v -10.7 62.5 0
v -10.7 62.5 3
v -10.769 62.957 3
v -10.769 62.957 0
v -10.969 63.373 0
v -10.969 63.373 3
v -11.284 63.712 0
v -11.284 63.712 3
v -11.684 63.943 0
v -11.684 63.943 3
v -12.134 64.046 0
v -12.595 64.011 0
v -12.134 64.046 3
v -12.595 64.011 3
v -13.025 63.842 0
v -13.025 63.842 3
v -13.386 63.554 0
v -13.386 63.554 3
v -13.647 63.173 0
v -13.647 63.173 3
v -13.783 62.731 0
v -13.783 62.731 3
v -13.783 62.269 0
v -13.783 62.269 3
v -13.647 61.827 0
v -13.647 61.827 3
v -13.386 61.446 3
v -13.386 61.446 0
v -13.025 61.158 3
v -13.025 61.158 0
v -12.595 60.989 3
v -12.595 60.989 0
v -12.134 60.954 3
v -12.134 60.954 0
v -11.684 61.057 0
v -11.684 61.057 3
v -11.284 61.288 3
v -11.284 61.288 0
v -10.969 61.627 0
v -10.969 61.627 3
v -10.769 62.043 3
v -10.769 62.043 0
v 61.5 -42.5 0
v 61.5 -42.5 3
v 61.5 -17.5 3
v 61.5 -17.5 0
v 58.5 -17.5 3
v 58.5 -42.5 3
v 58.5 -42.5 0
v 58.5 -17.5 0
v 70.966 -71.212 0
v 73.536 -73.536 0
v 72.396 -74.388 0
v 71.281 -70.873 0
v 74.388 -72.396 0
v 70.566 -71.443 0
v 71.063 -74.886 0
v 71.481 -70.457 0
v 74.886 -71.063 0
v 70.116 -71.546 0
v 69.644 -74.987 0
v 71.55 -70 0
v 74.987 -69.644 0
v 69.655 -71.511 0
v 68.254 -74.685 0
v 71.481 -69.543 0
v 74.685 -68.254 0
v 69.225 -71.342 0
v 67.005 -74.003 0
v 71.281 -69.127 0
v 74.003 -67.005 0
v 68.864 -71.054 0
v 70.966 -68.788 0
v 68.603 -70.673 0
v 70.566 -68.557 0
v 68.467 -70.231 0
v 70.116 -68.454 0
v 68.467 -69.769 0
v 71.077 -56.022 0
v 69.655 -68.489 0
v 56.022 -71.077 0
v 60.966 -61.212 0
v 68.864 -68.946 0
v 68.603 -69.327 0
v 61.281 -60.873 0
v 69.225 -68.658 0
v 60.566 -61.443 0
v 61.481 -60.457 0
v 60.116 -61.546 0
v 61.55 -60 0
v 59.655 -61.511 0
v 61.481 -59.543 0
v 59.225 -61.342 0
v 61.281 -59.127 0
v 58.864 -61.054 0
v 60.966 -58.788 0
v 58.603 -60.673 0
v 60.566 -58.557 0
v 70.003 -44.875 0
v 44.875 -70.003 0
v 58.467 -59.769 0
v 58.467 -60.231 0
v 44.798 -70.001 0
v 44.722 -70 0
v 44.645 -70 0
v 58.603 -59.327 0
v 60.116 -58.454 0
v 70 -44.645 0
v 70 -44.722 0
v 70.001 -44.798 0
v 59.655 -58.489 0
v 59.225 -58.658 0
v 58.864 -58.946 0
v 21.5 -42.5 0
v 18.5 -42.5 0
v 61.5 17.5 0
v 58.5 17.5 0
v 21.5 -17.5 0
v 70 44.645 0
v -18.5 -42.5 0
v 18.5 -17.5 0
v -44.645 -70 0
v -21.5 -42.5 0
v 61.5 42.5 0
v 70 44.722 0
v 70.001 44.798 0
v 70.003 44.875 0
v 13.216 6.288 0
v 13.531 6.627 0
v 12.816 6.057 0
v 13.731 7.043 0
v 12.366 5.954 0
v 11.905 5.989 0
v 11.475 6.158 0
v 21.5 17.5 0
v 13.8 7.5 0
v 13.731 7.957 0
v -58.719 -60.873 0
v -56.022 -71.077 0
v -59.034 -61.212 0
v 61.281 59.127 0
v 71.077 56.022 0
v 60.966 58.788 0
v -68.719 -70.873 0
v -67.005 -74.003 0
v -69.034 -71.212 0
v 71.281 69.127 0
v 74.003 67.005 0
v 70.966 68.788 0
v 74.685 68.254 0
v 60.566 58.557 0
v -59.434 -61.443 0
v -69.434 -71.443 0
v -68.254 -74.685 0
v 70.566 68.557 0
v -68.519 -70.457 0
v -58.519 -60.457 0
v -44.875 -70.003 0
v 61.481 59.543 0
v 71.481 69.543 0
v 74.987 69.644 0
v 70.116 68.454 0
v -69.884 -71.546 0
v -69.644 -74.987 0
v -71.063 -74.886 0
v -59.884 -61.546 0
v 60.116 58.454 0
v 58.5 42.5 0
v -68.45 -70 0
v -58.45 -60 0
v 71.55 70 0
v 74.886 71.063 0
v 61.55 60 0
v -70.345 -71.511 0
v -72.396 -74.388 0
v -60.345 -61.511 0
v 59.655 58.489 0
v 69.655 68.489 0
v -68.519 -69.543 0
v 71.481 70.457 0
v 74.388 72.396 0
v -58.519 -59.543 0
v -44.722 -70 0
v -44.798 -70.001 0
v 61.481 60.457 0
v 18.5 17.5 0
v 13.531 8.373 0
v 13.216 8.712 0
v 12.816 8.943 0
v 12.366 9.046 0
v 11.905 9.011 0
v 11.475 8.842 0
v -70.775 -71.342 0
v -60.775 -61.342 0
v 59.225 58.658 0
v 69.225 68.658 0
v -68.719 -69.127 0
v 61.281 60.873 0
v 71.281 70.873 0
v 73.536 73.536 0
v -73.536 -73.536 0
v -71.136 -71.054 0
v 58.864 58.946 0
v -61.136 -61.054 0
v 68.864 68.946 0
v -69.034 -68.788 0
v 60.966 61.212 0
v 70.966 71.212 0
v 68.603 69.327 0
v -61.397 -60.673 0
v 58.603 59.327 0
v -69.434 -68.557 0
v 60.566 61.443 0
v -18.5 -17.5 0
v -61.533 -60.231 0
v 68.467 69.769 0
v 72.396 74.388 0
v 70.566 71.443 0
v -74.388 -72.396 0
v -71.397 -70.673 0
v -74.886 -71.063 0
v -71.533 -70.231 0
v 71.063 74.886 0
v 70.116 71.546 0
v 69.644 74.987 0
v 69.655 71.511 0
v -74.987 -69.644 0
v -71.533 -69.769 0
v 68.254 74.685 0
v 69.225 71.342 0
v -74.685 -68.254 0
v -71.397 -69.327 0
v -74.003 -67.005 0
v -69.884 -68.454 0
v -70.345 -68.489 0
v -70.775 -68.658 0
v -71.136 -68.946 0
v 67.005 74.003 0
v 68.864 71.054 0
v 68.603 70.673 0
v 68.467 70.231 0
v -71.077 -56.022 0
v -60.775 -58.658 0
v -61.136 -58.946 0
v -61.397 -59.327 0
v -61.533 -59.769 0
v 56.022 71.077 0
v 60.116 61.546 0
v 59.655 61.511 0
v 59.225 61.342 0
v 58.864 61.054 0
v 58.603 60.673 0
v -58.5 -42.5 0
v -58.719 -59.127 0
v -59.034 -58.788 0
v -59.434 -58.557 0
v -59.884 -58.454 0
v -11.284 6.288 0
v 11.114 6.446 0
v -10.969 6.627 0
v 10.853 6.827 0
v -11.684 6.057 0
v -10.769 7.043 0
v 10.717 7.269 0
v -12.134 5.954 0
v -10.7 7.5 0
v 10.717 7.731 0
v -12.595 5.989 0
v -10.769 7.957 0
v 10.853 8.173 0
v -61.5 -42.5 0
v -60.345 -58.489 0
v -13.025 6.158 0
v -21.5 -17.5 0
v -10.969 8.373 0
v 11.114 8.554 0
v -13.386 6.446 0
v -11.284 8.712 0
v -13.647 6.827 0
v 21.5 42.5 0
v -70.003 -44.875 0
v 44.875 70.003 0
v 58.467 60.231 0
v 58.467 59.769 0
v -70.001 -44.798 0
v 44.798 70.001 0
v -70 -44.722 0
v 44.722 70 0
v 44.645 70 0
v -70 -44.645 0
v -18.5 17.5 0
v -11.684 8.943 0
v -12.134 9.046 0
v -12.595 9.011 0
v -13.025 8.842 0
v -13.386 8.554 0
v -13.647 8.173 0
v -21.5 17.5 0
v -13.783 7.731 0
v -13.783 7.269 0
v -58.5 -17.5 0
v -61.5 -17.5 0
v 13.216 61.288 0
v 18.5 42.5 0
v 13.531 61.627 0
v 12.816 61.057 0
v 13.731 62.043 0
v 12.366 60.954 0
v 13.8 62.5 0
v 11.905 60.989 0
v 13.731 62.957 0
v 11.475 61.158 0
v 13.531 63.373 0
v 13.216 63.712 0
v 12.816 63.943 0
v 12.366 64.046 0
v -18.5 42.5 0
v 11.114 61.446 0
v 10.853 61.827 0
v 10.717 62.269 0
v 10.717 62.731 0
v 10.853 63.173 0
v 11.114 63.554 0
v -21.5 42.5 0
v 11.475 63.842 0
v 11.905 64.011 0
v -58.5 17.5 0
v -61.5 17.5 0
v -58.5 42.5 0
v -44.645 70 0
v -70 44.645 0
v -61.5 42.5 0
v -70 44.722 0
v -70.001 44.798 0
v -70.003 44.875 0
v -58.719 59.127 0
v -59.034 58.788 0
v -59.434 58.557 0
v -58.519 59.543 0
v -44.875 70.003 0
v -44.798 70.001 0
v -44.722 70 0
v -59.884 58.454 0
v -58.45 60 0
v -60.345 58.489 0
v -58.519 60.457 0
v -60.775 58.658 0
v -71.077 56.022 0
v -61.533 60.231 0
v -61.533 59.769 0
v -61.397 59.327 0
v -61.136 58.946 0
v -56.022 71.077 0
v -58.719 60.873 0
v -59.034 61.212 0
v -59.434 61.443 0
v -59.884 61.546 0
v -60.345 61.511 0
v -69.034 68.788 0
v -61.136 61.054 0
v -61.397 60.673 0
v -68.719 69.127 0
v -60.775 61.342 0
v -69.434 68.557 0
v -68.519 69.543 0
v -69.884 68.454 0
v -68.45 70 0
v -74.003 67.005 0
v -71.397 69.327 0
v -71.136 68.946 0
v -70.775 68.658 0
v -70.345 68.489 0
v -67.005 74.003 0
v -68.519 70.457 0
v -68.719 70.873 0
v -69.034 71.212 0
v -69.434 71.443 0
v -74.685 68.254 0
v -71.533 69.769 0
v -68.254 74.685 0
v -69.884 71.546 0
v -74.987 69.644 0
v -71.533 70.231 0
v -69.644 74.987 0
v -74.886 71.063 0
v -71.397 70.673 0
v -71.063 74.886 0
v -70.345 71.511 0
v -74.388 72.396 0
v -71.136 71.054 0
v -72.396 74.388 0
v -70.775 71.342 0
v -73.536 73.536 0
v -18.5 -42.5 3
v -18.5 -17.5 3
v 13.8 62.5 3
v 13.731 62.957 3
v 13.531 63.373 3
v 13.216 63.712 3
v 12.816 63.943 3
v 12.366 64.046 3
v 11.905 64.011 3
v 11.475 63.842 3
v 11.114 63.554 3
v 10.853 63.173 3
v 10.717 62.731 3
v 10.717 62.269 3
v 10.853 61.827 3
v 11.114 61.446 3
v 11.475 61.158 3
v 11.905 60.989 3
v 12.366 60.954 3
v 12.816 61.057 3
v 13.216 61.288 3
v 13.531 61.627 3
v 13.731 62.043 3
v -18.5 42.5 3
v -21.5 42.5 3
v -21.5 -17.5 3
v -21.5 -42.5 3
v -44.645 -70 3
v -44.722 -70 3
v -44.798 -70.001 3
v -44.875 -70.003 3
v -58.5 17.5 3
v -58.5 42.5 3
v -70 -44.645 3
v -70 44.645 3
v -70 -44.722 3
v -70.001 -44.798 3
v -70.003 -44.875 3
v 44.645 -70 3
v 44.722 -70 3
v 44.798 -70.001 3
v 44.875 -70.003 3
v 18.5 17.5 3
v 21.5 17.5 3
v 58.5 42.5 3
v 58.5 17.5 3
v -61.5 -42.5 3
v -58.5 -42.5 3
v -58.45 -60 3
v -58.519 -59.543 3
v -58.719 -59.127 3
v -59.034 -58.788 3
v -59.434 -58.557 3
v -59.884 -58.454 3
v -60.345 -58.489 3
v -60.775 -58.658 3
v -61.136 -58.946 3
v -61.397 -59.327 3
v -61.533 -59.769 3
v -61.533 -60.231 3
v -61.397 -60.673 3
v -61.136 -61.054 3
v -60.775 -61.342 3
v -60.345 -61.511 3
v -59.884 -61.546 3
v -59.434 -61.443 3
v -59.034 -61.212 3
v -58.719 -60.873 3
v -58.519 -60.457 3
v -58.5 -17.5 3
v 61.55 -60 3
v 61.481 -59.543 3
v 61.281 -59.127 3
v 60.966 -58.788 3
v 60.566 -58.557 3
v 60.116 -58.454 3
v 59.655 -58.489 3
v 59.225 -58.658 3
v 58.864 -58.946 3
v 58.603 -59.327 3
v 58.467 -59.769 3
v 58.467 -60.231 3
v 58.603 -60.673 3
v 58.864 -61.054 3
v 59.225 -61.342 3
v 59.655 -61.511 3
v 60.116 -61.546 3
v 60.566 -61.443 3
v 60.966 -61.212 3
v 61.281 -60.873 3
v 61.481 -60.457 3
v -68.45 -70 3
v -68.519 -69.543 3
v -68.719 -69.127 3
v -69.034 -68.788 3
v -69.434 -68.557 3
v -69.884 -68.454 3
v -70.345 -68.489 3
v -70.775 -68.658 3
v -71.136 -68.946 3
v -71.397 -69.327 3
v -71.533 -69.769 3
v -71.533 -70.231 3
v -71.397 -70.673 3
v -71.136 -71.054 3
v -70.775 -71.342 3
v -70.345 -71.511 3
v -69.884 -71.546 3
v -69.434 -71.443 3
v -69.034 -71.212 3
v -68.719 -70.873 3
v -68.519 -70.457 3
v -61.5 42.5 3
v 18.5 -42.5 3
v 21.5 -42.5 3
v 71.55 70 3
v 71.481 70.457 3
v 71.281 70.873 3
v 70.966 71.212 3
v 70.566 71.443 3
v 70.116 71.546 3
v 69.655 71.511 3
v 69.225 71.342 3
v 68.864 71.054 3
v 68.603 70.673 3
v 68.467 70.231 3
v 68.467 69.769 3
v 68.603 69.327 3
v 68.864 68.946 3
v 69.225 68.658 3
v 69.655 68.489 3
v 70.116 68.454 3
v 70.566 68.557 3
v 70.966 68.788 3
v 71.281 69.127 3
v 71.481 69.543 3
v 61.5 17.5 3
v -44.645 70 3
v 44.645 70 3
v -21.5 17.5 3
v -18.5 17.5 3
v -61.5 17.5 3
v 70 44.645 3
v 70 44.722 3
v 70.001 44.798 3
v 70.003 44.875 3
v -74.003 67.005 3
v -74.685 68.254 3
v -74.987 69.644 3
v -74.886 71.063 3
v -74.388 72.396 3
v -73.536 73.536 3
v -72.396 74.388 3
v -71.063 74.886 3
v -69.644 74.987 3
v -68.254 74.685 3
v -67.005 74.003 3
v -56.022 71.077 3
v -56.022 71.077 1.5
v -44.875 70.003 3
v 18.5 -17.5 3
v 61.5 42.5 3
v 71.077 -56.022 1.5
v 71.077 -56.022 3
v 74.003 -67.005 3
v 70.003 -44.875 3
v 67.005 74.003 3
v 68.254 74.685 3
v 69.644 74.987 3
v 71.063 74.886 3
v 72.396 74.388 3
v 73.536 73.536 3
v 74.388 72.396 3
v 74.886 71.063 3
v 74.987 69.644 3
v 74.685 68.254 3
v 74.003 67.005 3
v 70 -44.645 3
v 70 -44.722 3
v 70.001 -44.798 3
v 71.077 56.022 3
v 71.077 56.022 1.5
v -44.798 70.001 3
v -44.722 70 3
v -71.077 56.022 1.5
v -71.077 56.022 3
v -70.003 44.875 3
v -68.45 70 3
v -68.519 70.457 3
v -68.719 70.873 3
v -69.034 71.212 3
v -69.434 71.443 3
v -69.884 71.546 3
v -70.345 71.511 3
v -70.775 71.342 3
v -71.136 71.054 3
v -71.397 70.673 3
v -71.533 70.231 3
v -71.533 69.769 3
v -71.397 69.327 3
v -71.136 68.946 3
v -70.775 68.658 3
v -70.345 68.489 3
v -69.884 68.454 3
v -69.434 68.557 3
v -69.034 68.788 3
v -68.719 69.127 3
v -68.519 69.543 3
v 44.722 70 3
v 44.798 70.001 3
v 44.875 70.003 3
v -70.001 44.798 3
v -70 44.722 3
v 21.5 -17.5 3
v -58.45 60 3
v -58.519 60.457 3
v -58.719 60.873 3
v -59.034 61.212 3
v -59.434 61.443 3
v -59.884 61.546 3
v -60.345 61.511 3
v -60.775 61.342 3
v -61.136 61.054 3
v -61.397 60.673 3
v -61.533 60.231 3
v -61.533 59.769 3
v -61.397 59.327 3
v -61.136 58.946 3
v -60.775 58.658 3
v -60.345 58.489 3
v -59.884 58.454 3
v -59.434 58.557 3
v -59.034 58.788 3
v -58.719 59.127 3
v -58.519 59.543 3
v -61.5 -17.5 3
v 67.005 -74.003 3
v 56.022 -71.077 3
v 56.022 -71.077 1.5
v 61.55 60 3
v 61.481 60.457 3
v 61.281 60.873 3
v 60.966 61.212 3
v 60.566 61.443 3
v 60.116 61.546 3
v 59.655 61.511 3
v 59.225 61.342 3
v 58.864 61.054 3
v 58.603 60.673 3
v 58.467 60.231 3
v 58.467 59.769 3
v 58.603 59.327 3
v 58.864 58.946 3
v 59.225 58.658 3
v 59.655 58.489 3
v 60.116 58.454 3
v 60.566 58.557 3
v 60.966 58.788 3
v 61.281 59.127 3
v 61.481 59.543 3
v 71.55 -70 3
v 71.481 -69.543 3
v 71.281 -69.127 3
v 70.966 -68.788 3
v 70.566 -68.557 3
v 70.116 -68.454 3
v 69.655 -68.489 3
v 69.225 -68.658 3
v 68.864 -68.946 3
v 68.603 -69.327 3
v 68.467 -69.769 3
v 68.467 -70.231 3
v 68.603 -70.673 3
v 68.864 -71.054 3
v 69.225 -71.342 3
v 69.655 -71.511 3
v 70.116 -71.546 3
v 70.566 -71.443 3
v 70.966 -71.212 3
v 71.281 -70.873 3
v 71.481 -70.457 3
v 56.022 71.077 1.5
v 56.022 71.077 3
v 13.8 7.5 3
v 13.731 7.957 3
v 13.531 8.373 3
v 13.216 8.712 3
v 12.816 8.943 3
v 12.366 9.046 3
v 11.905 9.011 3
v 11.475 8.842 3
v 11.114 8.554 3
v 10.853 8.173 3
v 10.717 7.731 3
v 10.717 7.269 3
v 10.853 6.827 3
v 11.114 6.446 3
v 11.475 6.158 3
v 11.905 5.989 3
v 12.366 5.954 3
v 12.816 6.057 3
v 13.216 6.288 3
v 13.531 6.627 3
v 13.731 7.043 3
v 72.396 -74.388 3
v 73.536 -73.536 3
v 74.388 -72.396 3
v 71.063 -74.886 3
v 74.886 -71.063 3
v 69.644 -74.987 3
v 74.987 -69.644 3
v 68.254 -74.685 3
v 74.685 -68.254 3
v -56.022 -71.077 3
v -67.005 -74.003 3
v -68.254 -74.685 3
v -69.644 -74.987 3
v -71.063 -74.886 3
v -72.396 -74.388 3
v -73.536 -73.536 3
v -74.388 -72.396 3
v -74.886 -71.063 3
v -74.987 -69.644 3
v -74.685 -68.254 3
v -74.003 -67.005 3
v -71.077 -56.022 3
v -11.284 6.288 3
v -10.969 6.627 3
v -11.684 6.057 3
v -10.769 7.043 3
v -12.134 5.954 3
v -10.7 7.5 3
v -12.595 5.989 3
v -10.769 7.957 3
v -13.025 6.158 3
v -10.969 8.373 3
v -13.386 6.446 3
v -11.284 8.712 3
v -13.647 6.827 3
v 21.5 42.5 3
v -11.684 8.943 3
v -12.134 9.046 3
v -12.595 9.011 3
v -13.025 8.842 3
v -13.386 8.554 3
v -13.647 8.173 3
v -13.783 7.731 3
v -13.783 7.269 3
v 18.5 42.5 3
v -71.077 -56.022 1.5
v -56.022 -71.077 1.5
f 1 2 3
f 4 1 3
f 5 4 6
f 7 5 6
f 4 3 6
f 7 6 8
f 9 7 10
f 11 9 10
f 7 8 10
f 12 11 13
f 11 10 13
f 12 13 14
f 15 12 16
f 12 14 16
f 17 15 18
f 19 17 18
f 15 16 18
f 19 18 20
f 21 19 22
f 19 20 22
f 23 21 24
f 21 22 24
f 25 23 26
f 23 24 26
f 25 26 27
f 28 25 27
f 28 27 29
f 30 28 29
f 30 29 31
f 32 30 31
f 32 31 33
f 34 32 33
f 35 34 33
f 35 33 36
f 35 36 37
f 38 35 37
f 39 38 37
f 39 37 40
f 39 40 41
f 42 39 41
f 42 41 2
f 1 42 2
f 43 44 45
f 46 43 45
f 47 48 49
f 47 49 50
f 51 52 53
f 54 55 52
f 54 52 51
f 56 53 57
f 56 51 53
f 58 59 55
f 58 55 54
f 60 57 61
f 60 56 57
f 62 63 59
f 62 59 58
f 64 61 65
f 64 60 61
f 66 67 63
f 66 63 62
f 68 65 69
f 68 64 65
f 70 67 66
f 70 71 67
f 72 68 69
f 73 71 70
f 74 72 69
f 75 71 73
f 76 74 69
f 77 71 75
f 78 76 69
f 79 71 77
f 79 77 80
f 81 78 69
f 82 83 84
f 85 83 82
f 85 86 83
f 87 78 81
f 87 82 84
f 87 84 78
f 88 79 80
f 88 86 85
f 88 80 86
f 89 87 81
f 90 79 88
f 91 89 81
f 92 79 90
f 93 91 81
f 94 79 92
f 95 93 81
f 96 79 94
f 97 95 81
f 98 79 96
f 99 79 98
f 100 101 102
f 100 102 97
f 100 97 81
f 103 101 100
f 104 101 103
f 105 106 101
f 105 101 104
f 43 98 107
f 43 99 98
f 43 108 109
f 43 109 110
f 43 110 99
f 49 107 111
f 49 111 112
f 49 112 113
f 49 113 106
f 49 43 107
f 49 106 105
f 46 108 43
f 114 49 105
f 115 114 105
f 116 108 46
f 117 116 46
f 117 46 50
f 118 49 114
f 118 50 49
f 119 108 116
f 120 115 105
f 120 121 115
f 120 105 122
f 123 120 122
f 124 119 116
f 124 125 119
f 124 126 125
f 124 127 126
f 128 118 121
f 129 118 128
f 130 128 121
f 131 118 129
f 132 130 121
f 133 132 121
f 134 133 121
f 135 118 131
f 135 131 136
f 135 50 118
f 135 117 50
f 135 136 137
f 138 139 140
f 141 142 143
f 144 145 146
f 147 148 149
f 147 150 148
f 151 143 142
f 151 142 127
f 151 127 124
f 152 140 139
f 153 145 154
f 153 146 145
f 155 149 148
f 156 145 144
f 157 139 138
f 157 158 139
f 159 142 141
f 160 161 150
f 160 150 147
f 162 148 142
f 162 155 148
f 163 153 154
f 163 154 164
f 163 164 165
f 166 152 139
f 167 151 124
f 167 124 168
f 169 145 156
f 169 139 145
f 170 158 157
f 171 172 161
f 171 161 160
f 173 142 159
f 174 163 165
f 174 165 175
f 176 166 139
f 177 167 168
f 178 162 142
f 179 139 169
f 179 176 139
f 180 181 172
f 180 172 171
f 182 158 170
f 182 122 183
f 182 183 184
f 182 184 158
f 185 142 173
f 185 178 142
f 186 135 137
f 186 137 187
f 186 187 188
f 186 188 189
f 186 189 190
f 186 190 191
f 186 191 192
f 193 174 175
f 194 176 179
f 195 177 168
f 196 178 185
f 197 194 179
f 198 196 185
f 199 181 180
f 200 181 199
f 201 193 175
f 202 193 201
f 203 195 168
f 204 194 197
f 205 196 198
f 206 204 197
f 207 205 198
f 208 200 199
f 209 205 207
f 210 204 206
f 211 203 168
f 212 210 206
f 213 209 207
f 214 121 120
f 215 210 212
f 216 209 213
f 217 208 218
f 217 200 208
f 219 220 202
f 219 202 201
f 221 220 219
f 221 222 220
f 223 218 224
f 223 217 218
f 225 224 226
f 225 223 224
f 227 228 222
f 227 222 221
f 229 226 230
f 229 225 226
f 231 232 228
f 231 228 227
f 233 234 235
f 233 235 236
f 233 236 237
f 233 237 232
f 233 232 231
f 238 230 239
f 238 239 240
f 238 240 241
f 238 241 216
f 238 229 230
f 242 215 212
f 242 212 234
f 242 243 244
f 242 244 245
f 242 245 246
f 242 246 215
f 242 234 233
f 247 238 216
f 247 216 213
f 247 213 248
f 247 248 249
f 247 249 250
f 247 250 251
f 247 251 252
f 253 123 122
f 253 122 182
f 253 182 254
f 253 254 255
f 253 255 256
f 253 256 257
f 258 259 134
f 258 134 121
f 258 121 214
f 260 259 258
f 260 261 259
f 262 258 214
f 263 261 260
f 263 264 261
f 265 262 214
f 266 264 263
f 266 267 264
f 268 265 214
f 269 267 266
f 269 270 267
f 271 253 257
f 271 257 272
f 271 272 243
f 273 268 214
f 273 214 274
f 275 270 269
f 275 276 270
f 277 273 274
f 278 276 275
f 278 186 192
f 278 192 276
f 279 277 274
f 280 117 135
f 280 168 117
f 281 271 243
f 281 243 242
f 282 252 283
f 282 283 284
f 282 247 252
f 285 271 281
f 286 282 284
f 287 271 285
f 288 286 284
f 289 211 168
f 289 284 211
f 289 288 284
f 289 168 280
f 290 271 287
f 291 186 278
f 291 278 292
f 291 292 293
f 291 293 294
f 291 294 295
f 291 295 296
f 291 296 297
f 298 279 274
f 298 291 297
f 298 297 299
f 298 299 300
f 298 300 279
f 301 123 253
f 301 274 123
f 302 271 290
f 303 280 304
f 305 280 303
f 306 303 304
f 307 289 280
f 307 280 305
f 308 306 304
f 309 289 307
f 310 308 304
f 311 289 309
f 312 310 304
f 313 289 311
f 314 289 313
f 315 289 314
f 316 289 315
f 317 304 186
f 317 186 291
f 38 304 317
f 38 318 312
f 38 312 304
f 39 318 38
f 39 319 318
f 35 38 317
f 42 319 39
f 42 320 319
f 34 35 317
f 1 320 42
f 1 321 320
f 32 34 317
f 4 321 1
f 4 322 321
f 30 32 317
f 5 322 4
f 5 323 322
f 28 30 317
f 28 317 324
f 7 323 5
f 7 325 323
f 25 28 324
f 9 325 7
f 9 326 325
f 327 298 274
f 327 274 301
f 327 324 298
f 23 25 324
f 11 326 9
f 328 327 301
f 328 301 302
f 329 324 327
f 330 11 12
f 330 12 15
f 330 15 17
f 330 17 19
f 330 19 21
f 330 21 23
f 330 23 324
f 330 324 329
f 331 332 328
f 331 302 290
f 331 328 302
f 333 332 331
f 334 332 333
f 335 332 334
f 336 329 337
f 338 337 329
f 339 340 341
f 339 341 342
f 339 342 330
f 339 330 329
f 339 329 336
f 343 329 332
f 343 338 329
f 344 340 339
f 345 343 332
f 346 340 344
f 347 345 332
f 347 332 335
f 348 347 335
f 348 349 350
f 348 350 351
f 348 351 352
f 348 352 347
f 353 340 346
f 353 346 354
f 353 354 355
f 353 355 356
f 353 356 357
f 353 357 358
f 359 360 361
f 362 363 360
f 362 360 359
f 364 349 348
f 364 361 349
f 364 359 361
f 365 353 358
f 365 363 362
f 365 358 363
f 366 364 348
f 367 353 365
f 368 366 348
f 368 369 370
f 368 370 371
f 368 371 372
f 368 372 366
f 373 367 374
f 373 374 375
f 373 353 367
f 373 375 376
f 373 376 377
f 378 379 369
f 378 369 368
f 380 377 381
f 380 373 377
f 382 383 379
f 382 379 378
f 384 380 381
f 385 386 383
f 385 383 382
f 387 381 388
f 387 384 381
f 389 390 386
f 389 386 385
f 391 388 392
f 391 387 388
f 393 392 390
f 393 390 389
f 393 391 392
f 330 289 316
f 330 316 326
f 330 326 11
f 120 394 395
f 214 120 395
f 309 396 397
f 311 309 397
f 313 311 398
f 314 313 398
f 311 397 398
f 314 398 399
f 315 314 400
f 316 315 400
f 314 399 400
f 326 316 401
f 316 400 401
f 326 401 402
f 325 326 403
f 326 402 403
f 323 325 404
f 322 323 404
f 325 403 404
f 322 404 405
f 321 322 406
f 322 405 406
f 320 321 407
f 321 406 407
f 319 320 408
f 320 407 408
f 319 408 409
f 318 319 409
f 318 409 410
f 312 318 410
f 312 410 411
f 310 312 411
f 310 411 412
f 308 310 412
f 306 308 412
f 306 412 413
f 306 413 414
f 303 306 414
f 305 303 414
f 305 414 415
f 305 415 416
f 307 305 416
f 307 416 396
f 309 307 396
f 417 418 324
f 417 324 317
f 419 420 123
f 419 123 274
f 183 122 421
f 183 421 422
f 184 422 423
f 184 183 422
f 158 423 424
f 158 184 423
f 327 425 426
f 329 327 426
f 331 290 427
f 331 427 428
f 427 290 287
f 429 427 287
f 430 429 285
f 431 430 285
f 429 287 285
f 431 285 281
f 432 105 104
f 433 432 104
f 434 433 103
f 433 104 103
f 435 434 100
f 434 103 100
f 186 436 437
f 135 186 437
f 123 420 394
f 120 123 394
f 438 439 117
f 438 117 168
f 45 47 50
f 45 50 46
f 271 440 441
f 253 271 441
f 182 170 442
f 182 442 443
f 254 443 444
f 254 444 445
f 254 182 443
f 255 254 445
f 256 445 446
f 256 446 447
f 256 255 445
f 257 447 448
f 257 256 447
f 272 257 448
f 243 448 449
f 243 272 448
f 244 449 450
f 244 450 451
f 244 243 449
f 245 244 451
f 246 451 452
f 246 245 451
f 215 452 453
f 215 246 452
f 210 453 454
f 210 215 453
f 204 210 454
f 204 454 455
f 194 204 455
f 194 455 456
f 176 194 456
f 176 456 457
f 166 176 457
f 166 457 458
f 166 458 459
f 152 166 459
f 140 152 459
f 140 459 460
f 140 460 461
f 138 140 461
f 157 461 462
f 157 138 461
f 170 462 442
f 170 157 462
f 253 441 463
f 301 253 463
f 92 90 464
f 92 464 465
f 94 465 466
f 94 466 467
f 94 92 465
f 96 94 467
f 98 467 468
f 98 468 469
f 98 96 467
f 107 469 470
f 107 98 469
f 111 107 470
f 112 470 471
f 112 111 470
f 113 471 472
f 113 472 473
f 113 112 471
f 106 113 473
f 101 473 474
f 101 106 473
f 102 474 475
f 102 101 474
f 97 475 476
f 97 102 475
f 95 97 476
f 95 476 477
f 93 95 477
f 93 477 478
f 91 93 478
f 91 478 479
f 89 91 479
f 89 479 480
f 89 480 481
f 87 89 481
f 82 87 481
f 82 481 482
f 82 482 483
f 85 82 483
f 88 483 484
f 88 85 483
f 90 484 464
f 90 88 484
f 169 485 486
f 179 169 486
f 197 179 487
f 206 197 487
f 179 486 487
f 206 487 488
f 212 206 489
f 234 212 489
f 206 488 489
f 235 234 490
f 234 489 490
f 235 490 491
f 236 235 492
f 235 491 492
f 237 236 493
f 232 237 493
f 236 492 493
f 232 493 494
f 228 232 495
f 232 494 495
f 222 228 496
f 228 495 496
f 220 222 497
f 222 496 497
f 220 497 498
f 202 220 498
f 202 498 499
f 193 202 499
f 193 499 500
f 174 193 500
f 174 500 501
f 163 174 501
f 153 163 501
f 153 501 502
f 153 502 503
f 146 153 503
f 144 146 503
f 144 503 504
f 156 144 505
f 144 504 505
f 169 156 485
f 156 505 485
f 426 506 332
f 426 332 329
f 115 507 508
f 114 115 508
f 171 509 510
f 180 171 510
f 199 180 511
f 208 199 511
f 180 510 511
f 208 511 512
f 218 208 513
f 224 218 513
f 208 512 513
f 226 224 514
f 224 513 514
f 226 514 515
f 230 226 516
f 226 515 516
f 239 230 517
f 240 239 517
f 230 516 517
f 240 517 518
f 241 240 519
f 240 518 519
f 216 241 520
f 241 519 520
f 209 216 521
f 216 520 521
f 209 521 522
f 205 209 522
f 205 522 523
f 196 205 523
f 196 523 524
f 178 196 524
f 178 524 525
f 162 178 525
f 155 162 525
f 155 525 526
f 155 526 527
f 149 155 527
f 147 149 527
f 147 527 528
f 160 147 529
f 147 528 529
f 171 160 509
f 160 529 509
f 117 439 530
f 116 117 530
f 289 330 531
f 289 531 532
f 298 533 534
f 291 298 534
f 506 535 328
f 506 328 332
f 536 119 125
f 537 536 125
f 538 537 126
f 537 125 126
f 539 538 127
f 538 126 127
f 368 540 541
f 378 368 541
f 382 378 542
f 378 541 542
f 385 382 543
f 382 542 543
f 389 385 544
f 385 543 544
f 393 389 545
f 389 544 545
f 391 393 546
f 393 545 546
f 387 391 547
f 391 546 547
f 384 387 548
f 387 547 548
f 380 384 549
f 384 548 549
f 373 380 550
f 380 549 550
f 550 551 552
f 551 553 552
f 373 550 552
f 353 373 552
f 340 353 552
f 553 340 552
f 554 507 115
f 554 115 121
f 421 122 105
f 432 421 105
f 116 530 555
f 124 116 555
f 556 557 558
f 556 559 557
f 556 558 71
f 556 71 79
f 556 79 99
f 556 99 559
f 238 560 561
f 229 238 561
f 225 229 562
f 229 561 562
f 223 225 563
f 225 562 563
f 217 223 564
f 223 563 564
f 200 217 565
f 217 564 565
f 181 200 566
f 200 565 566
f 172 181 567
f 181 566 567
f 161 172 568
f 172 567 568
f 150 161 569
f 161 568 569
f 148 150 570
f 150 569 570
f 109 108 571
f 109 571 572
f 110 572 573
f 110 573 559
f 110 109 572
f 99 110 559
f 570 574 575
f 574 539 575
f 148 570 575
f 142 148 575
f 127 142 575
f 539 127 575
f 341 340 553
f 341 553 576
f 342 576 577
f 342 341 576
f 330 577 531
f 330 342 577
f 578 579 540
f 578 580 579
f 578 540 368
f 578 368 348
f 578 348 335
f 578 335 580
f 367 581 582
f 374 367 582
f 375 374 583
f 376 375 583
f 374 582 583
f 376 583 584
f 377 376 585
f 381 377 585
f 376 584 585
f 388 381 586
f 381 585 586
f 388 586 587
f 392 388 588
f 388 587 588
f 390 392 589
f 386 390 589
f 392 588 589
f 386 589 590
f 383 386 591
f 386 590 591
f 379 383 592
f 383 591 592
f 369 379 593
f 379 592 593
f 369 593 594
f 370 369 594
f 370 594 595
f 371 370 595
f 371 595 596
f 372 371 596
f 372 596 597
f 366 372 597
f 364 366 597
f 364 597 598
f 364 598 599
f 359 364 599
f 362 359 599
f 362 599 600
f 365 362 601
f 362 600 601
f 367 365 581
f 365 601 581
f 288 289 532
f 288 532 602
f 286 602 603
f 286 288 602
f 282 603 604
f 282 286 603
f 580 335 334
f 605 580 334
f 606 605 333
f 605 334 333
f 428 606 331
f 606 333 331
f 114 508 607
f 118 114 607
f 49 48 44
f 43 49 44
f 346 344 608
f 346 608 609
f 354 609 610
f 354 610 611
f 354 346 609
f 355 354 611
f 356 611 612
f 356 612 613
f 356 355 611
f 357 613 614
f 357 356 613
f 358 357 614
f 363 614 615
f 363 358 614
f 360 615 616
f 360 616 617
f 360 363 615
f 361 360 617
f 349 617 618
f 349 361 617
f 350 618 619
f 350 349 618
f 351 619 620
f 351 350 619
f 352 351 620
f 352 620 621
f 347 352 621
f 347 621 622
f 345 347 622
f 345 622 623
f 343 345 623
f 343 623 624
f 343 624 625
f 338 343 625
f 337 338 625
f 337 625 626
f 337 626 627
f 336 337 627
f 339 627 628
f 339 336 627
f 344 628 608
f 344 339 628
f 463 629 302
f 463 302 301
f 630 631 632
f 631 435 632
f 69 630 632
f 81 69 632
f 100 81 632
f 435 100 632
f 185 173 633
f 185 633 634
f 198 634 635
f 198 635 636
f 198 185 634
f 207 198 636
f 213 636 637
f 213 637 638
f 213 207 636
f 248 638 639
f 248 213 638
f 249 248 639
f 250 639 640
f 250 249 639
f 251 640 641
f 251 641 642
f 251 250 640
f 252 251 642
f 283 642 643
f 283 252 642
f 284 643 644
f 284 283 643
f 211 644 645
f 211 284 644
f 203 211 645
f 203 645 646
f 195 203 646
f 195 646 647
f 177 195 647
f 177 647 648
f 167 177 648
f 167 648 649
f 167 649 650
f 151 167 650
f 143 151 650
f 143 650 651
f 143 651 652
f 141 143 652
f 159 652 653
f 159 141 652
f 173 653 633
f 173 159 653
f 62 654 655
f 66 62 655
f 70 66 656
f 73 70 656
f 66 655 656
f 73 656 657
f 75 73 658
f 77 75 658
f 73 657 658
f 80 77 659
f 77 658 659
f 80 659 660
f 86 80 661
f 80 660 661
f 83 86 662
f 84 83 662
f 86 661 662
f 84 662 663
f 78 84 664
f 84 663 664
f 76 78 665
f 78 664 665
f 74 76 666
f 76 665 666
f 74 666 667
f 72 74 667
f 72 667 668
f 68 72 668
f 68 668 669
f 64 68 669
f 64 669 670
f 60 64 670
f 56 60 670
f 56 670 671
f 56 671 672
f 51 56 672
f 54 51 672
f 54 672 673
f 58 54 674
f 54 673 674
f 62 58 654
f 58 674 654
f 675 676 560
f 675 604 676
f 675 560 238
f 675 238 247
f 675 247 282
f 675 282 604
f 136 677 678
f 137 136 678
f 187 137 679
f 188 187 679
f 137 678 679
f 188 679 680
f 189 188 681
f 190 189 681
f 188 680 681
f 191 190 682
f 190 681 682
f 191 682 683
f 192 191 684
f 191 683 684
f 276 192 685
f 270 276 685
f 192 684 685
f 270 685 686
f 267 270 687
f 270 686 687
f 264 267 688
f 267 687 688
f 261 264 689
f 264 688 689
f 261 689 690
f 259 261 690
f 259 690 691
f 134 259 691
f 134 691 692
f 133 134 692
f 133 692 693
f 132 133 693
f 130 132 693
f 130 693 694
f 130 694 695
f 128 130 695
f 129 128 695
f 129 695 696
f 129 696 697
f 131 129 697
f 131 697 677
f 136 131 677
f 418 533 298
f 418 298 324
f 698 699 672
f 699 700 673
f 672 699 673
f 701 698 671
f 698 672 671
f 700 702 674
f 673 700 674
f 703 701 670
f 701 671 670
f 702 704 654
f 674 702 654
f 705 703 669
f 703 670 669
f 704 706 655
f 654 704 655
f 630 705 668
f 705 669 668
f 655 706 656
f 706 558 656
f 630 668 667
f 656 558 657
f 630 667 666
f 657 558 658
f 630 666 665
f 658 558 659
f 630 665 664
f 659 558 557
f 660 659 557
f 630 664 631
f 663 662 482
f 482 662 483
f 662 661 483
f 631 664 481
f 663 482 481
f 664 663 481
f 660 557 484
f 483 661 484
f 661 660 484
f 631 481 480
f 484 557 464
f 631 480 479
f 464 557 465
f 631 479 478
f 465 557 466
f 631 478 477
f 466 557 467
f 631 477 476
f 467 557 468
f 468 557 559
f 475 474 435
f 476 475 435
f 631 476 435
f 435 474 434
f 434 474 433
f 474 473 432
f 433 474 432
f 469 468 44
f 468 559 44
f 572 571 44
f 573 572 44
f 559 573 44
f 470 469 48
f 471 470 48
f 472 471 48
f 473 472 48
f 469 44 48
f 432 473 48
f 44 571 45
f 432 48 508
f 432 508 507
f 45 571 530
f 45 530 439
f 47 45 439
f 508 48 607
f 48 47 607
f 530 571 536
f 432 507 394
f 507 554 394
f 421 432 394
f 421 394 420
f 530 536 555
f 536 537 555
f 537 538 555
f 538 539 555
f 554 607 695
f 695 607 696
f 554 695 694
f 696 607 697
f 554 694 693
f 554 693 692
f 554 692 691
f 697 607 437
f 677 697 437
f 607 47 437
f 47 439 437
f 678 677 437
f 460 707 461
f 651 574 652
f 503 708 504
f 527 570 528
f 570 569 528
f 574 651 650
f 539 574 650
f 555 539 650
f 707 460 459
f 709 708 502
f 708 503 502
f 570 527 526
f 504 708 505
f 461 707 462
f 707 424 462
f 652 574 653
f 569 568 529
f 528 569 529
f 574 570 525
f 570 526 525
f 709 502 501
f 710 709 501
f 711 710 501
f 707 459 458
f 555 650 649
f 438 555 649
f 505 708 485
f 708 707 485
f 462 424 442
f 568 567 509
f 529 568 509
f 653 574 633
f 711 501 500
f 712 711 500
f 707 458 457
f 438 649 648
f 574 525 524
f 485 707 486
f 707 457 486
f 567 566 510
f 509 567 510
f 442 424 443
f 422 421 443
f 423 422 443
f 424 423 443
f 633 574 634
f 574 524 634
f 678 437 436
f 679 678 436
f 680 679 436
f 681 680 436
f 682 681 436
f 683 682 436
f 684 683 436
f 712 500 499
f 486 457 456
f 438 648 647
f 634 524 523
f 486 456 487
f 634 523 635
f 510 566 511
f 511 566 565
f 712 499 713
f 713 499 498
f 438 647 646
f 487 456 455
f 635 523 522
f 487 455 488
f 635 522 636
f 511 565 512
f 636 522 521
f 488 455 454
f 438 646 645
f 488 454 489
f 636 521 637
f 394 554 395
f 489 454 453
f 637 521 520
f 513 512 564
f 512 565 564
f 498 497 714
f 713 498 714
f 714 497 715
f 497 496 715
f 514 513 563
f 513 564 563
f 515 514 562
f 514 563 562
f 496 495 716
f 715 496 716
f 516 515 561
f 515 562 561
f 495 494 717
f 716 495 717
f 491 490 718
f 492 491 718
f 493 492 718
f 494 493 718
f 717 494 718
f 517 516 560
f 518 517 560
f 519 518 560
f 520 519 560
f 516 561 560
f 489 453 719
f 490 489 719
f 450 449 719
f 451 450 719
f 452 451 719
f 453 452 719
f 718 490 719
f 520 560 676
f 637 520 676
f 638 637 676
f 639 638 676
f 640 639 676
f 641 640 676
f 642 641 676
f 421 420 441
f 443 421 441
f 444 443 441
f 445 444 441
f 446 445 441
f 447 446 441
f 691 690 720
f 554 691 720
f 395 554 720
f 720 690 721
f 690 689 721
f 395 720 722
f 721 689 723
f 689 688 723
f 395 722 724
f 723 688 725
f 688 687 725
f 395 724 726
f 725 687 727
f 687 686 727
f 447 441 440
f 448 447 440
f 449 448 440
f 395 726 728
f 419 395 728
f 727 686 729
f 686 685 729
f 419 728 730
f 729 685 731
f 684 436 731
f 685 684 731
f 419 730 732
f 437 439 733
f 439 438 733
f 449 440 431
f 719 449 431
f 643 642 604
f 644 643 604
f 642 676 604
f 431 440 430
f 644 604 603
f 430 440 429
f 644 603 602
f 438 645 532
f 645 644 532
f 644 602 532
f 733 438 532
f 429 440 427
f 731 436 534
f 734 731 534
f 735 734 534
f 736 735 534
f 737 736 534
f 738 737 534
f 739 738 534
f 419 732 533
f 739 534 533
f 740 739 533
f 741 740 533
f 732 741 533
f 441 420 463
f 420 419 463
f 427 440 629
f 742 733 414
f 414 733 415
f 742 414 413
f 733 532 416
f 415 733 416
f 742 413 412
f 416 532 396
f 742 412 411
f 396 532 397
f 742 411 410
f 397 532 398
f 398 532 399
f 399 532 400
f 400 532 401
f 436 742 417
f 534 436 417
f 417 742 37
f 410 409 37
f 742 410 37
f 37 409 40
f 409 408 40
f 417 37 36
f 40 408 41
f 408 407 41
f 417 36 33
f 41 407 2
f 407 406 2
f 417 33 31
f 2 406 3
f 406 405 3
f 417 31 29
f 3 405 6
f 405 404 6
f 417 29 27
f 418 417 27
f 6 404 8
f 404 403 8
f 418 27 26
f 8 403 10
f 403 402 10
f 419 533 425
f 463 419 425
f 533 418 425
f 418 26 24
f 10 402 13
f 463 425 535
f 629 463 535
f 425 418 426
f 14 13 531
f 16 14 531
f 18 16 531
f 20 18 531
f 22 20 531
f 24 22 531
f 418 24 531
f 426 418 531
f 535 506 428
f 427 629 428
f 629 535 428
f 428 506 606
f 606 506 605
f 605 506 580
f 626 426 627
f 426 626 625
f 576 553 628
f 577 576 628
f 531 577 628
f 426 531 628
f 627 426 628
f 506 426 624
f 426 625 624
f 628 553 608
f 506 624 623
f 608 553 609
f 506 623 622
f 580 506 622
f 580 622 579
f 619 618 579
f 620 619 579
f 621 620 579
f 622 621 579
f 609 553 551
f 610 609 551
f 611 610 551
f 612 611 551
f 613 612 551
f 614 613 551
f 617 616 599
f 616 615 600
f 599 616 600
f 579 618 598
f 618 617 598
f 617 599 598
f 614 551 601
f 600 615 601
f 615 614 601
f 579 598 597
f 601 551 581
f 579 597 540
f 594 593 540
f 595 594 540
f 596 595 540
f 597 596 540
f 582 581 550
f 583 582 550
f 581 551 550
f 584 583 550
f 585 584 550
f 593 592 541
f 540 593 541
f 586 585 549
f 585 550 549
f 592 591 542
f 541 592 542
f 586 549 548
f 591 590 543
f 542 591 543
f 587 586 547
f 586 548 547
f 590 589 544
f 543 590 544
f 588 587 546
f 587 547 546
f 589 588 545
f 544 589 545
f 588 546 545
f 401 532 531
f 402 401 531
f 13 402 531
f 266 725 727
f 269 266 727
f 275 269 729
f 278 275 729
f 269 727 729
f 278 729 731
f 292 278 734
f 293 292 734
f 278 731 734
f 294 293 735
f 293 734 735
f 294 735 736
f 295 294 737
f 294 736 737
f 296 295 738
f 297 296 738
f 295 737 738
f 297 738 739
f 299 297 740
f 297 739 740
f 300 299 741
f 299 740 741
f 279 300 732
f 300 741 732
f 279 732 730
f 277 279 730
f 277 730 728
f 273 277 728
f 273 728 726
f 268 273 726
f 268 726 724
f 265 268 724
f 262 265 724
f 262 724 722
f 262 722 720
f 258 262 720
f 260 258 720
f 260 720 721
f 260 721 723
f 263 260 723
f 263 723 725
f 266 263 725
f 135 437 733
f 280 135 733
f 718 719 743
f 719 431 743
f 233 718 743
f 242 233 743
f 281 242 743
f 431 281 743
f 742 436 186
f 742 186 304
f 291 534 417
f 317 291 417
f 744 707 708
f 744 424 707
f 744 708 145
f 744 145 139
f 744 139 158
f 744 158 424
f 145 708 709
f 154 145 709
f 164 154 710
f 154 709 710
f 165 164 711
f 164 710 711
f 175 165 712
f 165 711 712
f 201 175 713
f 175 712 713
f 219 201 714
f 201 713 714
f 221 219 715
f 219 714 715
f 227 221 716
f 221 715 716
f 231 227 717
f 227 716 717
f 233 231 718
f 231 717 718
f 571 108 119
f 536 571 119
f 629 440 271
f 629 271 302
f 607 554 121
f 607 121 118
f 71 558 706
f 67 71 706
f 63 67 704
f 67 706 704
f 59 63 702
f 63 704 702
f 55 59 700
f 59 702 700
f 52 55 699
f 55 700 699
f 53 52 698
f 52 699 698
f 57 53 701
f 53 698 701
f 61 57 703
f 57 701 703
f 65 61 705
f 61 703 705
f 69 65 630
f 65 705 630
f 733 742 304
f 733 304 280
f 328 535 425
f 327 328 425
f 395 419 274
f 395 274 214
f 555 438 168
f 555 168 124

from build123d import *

# Parameters (mm, degrees)
SKETCH_1_W          = 140
SKETCH_1_H          = 140
SKETCH_1_R          = 1.55
EXTRUDE_1_DEPTH     = 3
SKETCH_2_R          = 1.55
SKETCH_2_W          = 3
SKETCH_2_H          = 25
CUT_EXTRUDE_1_DEPTH = 100.040395799
SKETCH_3_R          = 3
SKETCH_3_R_2        = 1.55
EXTRUDE_2_DEPTH     = 3
FILLET_1_R          = 10
SKETCH_7_W          = 252.152927368
SKETCH_7_H          = 251.6818607
CUT_EXTRUDE_3_DEPTH = 3
SKETCH_8_R          = 1.55
CUT_EXTRUDE_4_DEPTH = 3


with BuildPart() as part:
    # 草圖1 → 填料-伸長1 (new body)
    with BuildSketch(Plane.XY):
        Rectangle(SKETCH_1_W, SKETCH_1_H)
        with Locations((-60, 60)):
            Circle(SKETCH_1_R, mode=Mode.SUBTRACT)
        with Locations((60, 60)):
            Circle(SKETCH_1_R, mode=Mode.SUBTRACT)
        with Locations((60, -60)):
            Circle(SKETCH_1_R, mode=Mode.SUBTRACT)
        with Locations((-60, -60)):
            Circle(SKETCH_1_R, mode=Mode.SUBTRACT)
    extrude(amount=EXTRUDE_1_DEPTH)

    # 草圖2 → 除料-伸長1 (cut, through all)
    with BuildSketch(Plane.XY.offset(3)):
        with Locations((-12.25, 62.5)):
            Circle(SKETCH_2_R)
        with Locations((12.25, 62.5)):
            Circle(SKETCH_2_R)
        with Locations((-12.25, 7.5)):
            Circle(SKETCH_2_R)
        with Locations((12.25, 7.5)):
            Circle(SKETCH_2_R)
        with Locations((-60, -30)):
            Rectangle(SKETCH_2_W, SKETCH_2_H)
        with Locations((-60, 30)):
            Rectangle(SKETCH_2_W, SKETCH_2_H)
        with Locations((-20, -30)):
            Rectangle(SKETCH_2_W, SKETCH_2_H)
        with Locations((-20, 30)):
            Rectangle(SKETCH_2_W, SKETCH_2_H)
        with Locations((20, 30)):
            Rectangle(SKETCH_2_W, SKETCH_2_H)
        with Locations((20, -30)):
            Rectangle(SKETCH_2_W, SKETCH_2_H)
        with Locations((60, -30)):
            Rectangle(SKETCH_2_W, SKETCH_2_H)
        with Locations((60, 30)):
            Rectangle(SKETCH_2_W, SKETCH_2_H)
    extrude(amount=-CUT_EXTRUDE_1_DEPTH, mode=Mode.SUBTRACT)

    # 草圖3 → 填料-伸長2 (add)
    # profile 1 of 4: a face of its own
    with BuildSketch(Plane.XY.offset(3)):
        with BuildLine():
            Line((-79.393398282, 100.606601718), (-48.786796564, 70))
            Line((-48.786796564, 70), (-70, 70))
            Line((-70, 70), (-70, 48.786796564))
            Line((-70, 48.786796564), (-100.606601718, 79.393398282))
            ThreePointArc((-100.606601718, 79.393398282), (-100.606601718, 100.606601718), (-79.393398282, 100.606601718))
        make_face()
        with Locations((-90, 90)):
            Circle(SKETCH_3_R, mode=Mode.SUBTRACT)
        with Locations((-81, 90)):
            Circle(SKETCH_3_R_2, mode=Mode.SUBTRACT)
        with Locations((-90, 98)):
            Circle(SKETCH_3_R_2, mode=Mode.SUBTRACT)
        with Locations(Location((-99, 90, 0), (0, 0, 180))):
            Circle(SKETCH_3_R_2, mode=Mode.SUBTRACT)
        with Locations(Location((-90, 82, 0), (0, 0, 180))):
            Circle(SKETCH_3_R_2, mode=Mode.SUBTRACT)
    # profile 2 of 4: a face of its own
    with BuildSketch(Plane.XY.offset(3)):
        with BuildLine():
            Line((48.786796564, 70), (70, 70))
            Line((70, 70), (70, 48.786796564))
            Line((70, 48.786796564), (100.606601718, 79.393398282))
            ThreePointArc((100.606601718, 79.393398282), (100.606601718, 100.606601718), (79.393398282, 100.606601718))
            Line((79.393398282, 100.606601718), (48.786796564, 70))
        make_face()
        with Locations(Location((81, 90, 0), (0, 0, 180))):
            Circle(SKETCH_3_R_2, mode=Mode.SUBTRACT)
        with Locations(Location((90, 90, 0), (0, 0, 180))):
            Circle(SKETCH_3_R, mode=Mode.SUBTRACT)
        with Locations((90, 82)):
            Circle(SKETCH_3_R_2, mode=Mode.SUBTRACT)
        with Locations(Location((90, 98, 0), (0, 0, 180))):
            Circle(SKETCH_3_R_2, mode=Mode.SUBTRACT)
        with Locations((99, 90)):
            Circle(SKETCH_3_R_2, mode=Mode.SUBTRACT)
    # profile 3 of 4: a face of its own
    with BuildSketch(Plane.XY.offset(3)):
        with BuildLine():
            Line((-48.786796564, -70), (-70, -70))
            Line((-70, -70), (-70, -48.786796564))
            Line((-70, -48.786796564), (-100.606601718, -79.393398282))
            ThreePointArc((-100.606601718, -79.393398282), (-100.606601718, -100.606601718), (-79.393398282, -100.606601718))
            Line((-79.393398282, -100.606601718), (-48.786796564, -70))
        make_face()
        with Locations((-90, -82)):
            Circle(SKETCH_3_R_2, mode=Mode.SUBTRACT)
        with Locations(Location((-90, -90, 0), (0, 0, 180))):
            Circle(SKETCH_3_R, mode=Mode.SUBTRACT)
        with Locations(Location((-81, -90, 0), (0, 0, 180))):
            Circle(SKETCH_3_R_2, mode=Mode.SUBTRACT)
        with Locations(Location((-90, -98, 0), (0, 0, 180))):
            Circle(SKETCH_3_R_2, mode=Mode.SUBTRACT)
        with Locations((-99, -90)):
            Circle(SKETCH_3_R_2, mode=Mode.SUBTRACT)
    # profile 4 of 4: a face of its own
    with BuildSketch(Plane.XY.offset(3)):
        with BuildLine():
            Line((79.393398282, -100.606601718), (48.786796564, -70))
            Line((48.786796564, -70), (70, -70))
            Line((70, -70), (70, -48.786796564))
            Line((70, -48.786796564), (100.606601718, -79.393398282))
            ThreePointArc((100.606601718, -79.393398282), (100.606601718, -100.606601718), (79.393398282, -100.606601718))
        make_face()
        with Locations(Location((90, -82, 0), (0, 0, 180))):
            Circle(SKETCH_3_R_2, mode=Mode.SUBTRACT)
        with Locations((90, -90)):
            Circle(SKETCH_3_R, mode=Mode.SUBTRACT)
        with Locations((81, -90)):
            Circle(SKETCH_3_R_2, mode=Mode.SUBTRACT)
        with Locations((90, -98)):
            Circle(SKETCH_3_R_2, mode=Mode.SUBTRACT)
        with Locations(Location((99, -90, 0), (0, 0, 180))):
            Circle(SKETCH_3_R_2, mode=Mode.SUBTRACT)
    extrude(amount=-EXTRUDE_2_DEPTH)

    # 圓角1
    fillet_1_edges = [part.edges().sort_by_distance(p)[0] for p in [
        (-48.786796564, 70, 1.5),
        (-70, 48.786796564, 1.5),
        (70, 48.786796564, 1.5),
        (48.786796564, 70, 1.5),
        (-70, -48.786796564, 1.5),
        (-48.786796564, -70, 1.5),
        (48.786796564, -70, 1.5),
        (70, -48.786796564, 1.5),
    ]]
    fillet(fillet_1_edges, radius=FILLET_1_R)

    # 草圖7 → 除料-伸長3 (cut)
    with BuildSketch(Plane.XY.offset(3)):
        Rectangle(SKETCH_7_W, SKETCH_7_H)
        with BuildLine():
            Line((-44.644660941, 70), (44.644660941, 70))
            add(Edge.make_bspline(
                [(67.004508048, 74.00337707), (55.992453544, 70.111599189), (44.644660941, 70)],
                knots=[0, 0, 0, 0.944247476, 0.944247476, 0.944247476], degree=2))
            ThreePointArc((67.004508048, 74.00337707), (73.535533906, 73.535533906), (74.00337707, 67.004508048))
            add(Edge.make_bspline(
                [(74.00337707, 67.004508048), (70.111599189, 55.992453544), (70, 44.644660941)],
                knots=[0, 0, 0, 0.944247476, 0.944247476, 0.944247476], degree=2))
            Line((70, 44.644660941), (70, -44.644660941))
            add(Edge.make_bspline(
                [(74.00337707, -67.004508048), (70.111599189, -55.992453544), (70, -44.644660941)],
                knots=[0, 0, 0, 0.944247476, 0.944247476, 0.944247476], degree=2))
            ThreePointArc((74.00337707, -67.004508048), (73.535533906, -73.535533906), (67.004508048, -74.00337707))
            add(Edge.make_bspline(
                [(67.004508048, -74.00337707), (55.992453544, -70.111599189), (44.644660941, -70)],
                knots=[0, 0, 0, 0.944247476, 0.944247476, 0.944247476], degree=2))
            Line((44.644660941, -70), (-44.644660941, -70))
            add(Edge.make_bspline(
                [(-67.004508048, -74.00337707), (-55.992453544, -70.111599189), (-44.644660941, -70)],
                knots=[0, 0, 0, 0.944247476, 0.944247476, 0.944247476], degree=2))
            ThreePointArc((-67.004508048, -74.00337707), (-73.535533906, -73.535533906), (-74.00337707, -67.004508048))
            add(Edge.make_bspline(
                [(-74.00337707, -67.004508048), (-70.111599189, -55.992453544), (-70, -44.644660941)],
                knots=[0, 0, 0, 0.944247476, 0.944247476, 0.944247476], degree=2))
            Line((-70, -44.644660941), (-70, 44.644660941))
            add(Edge.make_bspline(
                [(-74.00337707, 67.004508048), (-70.111599189, 55.992453544), (-70, 44.644660941)],
                knots=[0, 0, 0, 0.944247476, 0.944247476, 0.944247476], degree=2))
            ThreePointArc((-74.00337707, 67.004508048), (-73.535533906, 73.535533906), (-67.004508048, 74.00337707))
            add(Edge.make_bspline(
                [(-67.004508048, 74.00337707), (-55.992453544, 70.111599189), (-44.644660941, 70)],
                knots=[0, 0, 0, 0.944247476, 0.944247476, 0.944247476], degree=2))
        make_face(mode=Mode.SUBTRACT)
    extrude(amount=-CUT_EXTRUDE_3_DEPTH, mode=Mode.SUBTRACT)

    # 草圖8 → 除料-伸長4 (cut)
    with BuildSketch(Plane.XY.offset(3)):
        with Locations((-70, 70)):
            Circle(SKETCH_8_R)
        with Locations((70, 70)):
            Circle(SKETCH_8_R)
        with Locations((70, -70)):
            Circle(SKETCH_8_R)
        with Locations((-70, -70)):
            Circle(SKETCH_8_R)
    extrude(amount=-CUT_EXTRUDE_4_DEPTH, mode=Mode.SUBTRACT)


solid = part.part
